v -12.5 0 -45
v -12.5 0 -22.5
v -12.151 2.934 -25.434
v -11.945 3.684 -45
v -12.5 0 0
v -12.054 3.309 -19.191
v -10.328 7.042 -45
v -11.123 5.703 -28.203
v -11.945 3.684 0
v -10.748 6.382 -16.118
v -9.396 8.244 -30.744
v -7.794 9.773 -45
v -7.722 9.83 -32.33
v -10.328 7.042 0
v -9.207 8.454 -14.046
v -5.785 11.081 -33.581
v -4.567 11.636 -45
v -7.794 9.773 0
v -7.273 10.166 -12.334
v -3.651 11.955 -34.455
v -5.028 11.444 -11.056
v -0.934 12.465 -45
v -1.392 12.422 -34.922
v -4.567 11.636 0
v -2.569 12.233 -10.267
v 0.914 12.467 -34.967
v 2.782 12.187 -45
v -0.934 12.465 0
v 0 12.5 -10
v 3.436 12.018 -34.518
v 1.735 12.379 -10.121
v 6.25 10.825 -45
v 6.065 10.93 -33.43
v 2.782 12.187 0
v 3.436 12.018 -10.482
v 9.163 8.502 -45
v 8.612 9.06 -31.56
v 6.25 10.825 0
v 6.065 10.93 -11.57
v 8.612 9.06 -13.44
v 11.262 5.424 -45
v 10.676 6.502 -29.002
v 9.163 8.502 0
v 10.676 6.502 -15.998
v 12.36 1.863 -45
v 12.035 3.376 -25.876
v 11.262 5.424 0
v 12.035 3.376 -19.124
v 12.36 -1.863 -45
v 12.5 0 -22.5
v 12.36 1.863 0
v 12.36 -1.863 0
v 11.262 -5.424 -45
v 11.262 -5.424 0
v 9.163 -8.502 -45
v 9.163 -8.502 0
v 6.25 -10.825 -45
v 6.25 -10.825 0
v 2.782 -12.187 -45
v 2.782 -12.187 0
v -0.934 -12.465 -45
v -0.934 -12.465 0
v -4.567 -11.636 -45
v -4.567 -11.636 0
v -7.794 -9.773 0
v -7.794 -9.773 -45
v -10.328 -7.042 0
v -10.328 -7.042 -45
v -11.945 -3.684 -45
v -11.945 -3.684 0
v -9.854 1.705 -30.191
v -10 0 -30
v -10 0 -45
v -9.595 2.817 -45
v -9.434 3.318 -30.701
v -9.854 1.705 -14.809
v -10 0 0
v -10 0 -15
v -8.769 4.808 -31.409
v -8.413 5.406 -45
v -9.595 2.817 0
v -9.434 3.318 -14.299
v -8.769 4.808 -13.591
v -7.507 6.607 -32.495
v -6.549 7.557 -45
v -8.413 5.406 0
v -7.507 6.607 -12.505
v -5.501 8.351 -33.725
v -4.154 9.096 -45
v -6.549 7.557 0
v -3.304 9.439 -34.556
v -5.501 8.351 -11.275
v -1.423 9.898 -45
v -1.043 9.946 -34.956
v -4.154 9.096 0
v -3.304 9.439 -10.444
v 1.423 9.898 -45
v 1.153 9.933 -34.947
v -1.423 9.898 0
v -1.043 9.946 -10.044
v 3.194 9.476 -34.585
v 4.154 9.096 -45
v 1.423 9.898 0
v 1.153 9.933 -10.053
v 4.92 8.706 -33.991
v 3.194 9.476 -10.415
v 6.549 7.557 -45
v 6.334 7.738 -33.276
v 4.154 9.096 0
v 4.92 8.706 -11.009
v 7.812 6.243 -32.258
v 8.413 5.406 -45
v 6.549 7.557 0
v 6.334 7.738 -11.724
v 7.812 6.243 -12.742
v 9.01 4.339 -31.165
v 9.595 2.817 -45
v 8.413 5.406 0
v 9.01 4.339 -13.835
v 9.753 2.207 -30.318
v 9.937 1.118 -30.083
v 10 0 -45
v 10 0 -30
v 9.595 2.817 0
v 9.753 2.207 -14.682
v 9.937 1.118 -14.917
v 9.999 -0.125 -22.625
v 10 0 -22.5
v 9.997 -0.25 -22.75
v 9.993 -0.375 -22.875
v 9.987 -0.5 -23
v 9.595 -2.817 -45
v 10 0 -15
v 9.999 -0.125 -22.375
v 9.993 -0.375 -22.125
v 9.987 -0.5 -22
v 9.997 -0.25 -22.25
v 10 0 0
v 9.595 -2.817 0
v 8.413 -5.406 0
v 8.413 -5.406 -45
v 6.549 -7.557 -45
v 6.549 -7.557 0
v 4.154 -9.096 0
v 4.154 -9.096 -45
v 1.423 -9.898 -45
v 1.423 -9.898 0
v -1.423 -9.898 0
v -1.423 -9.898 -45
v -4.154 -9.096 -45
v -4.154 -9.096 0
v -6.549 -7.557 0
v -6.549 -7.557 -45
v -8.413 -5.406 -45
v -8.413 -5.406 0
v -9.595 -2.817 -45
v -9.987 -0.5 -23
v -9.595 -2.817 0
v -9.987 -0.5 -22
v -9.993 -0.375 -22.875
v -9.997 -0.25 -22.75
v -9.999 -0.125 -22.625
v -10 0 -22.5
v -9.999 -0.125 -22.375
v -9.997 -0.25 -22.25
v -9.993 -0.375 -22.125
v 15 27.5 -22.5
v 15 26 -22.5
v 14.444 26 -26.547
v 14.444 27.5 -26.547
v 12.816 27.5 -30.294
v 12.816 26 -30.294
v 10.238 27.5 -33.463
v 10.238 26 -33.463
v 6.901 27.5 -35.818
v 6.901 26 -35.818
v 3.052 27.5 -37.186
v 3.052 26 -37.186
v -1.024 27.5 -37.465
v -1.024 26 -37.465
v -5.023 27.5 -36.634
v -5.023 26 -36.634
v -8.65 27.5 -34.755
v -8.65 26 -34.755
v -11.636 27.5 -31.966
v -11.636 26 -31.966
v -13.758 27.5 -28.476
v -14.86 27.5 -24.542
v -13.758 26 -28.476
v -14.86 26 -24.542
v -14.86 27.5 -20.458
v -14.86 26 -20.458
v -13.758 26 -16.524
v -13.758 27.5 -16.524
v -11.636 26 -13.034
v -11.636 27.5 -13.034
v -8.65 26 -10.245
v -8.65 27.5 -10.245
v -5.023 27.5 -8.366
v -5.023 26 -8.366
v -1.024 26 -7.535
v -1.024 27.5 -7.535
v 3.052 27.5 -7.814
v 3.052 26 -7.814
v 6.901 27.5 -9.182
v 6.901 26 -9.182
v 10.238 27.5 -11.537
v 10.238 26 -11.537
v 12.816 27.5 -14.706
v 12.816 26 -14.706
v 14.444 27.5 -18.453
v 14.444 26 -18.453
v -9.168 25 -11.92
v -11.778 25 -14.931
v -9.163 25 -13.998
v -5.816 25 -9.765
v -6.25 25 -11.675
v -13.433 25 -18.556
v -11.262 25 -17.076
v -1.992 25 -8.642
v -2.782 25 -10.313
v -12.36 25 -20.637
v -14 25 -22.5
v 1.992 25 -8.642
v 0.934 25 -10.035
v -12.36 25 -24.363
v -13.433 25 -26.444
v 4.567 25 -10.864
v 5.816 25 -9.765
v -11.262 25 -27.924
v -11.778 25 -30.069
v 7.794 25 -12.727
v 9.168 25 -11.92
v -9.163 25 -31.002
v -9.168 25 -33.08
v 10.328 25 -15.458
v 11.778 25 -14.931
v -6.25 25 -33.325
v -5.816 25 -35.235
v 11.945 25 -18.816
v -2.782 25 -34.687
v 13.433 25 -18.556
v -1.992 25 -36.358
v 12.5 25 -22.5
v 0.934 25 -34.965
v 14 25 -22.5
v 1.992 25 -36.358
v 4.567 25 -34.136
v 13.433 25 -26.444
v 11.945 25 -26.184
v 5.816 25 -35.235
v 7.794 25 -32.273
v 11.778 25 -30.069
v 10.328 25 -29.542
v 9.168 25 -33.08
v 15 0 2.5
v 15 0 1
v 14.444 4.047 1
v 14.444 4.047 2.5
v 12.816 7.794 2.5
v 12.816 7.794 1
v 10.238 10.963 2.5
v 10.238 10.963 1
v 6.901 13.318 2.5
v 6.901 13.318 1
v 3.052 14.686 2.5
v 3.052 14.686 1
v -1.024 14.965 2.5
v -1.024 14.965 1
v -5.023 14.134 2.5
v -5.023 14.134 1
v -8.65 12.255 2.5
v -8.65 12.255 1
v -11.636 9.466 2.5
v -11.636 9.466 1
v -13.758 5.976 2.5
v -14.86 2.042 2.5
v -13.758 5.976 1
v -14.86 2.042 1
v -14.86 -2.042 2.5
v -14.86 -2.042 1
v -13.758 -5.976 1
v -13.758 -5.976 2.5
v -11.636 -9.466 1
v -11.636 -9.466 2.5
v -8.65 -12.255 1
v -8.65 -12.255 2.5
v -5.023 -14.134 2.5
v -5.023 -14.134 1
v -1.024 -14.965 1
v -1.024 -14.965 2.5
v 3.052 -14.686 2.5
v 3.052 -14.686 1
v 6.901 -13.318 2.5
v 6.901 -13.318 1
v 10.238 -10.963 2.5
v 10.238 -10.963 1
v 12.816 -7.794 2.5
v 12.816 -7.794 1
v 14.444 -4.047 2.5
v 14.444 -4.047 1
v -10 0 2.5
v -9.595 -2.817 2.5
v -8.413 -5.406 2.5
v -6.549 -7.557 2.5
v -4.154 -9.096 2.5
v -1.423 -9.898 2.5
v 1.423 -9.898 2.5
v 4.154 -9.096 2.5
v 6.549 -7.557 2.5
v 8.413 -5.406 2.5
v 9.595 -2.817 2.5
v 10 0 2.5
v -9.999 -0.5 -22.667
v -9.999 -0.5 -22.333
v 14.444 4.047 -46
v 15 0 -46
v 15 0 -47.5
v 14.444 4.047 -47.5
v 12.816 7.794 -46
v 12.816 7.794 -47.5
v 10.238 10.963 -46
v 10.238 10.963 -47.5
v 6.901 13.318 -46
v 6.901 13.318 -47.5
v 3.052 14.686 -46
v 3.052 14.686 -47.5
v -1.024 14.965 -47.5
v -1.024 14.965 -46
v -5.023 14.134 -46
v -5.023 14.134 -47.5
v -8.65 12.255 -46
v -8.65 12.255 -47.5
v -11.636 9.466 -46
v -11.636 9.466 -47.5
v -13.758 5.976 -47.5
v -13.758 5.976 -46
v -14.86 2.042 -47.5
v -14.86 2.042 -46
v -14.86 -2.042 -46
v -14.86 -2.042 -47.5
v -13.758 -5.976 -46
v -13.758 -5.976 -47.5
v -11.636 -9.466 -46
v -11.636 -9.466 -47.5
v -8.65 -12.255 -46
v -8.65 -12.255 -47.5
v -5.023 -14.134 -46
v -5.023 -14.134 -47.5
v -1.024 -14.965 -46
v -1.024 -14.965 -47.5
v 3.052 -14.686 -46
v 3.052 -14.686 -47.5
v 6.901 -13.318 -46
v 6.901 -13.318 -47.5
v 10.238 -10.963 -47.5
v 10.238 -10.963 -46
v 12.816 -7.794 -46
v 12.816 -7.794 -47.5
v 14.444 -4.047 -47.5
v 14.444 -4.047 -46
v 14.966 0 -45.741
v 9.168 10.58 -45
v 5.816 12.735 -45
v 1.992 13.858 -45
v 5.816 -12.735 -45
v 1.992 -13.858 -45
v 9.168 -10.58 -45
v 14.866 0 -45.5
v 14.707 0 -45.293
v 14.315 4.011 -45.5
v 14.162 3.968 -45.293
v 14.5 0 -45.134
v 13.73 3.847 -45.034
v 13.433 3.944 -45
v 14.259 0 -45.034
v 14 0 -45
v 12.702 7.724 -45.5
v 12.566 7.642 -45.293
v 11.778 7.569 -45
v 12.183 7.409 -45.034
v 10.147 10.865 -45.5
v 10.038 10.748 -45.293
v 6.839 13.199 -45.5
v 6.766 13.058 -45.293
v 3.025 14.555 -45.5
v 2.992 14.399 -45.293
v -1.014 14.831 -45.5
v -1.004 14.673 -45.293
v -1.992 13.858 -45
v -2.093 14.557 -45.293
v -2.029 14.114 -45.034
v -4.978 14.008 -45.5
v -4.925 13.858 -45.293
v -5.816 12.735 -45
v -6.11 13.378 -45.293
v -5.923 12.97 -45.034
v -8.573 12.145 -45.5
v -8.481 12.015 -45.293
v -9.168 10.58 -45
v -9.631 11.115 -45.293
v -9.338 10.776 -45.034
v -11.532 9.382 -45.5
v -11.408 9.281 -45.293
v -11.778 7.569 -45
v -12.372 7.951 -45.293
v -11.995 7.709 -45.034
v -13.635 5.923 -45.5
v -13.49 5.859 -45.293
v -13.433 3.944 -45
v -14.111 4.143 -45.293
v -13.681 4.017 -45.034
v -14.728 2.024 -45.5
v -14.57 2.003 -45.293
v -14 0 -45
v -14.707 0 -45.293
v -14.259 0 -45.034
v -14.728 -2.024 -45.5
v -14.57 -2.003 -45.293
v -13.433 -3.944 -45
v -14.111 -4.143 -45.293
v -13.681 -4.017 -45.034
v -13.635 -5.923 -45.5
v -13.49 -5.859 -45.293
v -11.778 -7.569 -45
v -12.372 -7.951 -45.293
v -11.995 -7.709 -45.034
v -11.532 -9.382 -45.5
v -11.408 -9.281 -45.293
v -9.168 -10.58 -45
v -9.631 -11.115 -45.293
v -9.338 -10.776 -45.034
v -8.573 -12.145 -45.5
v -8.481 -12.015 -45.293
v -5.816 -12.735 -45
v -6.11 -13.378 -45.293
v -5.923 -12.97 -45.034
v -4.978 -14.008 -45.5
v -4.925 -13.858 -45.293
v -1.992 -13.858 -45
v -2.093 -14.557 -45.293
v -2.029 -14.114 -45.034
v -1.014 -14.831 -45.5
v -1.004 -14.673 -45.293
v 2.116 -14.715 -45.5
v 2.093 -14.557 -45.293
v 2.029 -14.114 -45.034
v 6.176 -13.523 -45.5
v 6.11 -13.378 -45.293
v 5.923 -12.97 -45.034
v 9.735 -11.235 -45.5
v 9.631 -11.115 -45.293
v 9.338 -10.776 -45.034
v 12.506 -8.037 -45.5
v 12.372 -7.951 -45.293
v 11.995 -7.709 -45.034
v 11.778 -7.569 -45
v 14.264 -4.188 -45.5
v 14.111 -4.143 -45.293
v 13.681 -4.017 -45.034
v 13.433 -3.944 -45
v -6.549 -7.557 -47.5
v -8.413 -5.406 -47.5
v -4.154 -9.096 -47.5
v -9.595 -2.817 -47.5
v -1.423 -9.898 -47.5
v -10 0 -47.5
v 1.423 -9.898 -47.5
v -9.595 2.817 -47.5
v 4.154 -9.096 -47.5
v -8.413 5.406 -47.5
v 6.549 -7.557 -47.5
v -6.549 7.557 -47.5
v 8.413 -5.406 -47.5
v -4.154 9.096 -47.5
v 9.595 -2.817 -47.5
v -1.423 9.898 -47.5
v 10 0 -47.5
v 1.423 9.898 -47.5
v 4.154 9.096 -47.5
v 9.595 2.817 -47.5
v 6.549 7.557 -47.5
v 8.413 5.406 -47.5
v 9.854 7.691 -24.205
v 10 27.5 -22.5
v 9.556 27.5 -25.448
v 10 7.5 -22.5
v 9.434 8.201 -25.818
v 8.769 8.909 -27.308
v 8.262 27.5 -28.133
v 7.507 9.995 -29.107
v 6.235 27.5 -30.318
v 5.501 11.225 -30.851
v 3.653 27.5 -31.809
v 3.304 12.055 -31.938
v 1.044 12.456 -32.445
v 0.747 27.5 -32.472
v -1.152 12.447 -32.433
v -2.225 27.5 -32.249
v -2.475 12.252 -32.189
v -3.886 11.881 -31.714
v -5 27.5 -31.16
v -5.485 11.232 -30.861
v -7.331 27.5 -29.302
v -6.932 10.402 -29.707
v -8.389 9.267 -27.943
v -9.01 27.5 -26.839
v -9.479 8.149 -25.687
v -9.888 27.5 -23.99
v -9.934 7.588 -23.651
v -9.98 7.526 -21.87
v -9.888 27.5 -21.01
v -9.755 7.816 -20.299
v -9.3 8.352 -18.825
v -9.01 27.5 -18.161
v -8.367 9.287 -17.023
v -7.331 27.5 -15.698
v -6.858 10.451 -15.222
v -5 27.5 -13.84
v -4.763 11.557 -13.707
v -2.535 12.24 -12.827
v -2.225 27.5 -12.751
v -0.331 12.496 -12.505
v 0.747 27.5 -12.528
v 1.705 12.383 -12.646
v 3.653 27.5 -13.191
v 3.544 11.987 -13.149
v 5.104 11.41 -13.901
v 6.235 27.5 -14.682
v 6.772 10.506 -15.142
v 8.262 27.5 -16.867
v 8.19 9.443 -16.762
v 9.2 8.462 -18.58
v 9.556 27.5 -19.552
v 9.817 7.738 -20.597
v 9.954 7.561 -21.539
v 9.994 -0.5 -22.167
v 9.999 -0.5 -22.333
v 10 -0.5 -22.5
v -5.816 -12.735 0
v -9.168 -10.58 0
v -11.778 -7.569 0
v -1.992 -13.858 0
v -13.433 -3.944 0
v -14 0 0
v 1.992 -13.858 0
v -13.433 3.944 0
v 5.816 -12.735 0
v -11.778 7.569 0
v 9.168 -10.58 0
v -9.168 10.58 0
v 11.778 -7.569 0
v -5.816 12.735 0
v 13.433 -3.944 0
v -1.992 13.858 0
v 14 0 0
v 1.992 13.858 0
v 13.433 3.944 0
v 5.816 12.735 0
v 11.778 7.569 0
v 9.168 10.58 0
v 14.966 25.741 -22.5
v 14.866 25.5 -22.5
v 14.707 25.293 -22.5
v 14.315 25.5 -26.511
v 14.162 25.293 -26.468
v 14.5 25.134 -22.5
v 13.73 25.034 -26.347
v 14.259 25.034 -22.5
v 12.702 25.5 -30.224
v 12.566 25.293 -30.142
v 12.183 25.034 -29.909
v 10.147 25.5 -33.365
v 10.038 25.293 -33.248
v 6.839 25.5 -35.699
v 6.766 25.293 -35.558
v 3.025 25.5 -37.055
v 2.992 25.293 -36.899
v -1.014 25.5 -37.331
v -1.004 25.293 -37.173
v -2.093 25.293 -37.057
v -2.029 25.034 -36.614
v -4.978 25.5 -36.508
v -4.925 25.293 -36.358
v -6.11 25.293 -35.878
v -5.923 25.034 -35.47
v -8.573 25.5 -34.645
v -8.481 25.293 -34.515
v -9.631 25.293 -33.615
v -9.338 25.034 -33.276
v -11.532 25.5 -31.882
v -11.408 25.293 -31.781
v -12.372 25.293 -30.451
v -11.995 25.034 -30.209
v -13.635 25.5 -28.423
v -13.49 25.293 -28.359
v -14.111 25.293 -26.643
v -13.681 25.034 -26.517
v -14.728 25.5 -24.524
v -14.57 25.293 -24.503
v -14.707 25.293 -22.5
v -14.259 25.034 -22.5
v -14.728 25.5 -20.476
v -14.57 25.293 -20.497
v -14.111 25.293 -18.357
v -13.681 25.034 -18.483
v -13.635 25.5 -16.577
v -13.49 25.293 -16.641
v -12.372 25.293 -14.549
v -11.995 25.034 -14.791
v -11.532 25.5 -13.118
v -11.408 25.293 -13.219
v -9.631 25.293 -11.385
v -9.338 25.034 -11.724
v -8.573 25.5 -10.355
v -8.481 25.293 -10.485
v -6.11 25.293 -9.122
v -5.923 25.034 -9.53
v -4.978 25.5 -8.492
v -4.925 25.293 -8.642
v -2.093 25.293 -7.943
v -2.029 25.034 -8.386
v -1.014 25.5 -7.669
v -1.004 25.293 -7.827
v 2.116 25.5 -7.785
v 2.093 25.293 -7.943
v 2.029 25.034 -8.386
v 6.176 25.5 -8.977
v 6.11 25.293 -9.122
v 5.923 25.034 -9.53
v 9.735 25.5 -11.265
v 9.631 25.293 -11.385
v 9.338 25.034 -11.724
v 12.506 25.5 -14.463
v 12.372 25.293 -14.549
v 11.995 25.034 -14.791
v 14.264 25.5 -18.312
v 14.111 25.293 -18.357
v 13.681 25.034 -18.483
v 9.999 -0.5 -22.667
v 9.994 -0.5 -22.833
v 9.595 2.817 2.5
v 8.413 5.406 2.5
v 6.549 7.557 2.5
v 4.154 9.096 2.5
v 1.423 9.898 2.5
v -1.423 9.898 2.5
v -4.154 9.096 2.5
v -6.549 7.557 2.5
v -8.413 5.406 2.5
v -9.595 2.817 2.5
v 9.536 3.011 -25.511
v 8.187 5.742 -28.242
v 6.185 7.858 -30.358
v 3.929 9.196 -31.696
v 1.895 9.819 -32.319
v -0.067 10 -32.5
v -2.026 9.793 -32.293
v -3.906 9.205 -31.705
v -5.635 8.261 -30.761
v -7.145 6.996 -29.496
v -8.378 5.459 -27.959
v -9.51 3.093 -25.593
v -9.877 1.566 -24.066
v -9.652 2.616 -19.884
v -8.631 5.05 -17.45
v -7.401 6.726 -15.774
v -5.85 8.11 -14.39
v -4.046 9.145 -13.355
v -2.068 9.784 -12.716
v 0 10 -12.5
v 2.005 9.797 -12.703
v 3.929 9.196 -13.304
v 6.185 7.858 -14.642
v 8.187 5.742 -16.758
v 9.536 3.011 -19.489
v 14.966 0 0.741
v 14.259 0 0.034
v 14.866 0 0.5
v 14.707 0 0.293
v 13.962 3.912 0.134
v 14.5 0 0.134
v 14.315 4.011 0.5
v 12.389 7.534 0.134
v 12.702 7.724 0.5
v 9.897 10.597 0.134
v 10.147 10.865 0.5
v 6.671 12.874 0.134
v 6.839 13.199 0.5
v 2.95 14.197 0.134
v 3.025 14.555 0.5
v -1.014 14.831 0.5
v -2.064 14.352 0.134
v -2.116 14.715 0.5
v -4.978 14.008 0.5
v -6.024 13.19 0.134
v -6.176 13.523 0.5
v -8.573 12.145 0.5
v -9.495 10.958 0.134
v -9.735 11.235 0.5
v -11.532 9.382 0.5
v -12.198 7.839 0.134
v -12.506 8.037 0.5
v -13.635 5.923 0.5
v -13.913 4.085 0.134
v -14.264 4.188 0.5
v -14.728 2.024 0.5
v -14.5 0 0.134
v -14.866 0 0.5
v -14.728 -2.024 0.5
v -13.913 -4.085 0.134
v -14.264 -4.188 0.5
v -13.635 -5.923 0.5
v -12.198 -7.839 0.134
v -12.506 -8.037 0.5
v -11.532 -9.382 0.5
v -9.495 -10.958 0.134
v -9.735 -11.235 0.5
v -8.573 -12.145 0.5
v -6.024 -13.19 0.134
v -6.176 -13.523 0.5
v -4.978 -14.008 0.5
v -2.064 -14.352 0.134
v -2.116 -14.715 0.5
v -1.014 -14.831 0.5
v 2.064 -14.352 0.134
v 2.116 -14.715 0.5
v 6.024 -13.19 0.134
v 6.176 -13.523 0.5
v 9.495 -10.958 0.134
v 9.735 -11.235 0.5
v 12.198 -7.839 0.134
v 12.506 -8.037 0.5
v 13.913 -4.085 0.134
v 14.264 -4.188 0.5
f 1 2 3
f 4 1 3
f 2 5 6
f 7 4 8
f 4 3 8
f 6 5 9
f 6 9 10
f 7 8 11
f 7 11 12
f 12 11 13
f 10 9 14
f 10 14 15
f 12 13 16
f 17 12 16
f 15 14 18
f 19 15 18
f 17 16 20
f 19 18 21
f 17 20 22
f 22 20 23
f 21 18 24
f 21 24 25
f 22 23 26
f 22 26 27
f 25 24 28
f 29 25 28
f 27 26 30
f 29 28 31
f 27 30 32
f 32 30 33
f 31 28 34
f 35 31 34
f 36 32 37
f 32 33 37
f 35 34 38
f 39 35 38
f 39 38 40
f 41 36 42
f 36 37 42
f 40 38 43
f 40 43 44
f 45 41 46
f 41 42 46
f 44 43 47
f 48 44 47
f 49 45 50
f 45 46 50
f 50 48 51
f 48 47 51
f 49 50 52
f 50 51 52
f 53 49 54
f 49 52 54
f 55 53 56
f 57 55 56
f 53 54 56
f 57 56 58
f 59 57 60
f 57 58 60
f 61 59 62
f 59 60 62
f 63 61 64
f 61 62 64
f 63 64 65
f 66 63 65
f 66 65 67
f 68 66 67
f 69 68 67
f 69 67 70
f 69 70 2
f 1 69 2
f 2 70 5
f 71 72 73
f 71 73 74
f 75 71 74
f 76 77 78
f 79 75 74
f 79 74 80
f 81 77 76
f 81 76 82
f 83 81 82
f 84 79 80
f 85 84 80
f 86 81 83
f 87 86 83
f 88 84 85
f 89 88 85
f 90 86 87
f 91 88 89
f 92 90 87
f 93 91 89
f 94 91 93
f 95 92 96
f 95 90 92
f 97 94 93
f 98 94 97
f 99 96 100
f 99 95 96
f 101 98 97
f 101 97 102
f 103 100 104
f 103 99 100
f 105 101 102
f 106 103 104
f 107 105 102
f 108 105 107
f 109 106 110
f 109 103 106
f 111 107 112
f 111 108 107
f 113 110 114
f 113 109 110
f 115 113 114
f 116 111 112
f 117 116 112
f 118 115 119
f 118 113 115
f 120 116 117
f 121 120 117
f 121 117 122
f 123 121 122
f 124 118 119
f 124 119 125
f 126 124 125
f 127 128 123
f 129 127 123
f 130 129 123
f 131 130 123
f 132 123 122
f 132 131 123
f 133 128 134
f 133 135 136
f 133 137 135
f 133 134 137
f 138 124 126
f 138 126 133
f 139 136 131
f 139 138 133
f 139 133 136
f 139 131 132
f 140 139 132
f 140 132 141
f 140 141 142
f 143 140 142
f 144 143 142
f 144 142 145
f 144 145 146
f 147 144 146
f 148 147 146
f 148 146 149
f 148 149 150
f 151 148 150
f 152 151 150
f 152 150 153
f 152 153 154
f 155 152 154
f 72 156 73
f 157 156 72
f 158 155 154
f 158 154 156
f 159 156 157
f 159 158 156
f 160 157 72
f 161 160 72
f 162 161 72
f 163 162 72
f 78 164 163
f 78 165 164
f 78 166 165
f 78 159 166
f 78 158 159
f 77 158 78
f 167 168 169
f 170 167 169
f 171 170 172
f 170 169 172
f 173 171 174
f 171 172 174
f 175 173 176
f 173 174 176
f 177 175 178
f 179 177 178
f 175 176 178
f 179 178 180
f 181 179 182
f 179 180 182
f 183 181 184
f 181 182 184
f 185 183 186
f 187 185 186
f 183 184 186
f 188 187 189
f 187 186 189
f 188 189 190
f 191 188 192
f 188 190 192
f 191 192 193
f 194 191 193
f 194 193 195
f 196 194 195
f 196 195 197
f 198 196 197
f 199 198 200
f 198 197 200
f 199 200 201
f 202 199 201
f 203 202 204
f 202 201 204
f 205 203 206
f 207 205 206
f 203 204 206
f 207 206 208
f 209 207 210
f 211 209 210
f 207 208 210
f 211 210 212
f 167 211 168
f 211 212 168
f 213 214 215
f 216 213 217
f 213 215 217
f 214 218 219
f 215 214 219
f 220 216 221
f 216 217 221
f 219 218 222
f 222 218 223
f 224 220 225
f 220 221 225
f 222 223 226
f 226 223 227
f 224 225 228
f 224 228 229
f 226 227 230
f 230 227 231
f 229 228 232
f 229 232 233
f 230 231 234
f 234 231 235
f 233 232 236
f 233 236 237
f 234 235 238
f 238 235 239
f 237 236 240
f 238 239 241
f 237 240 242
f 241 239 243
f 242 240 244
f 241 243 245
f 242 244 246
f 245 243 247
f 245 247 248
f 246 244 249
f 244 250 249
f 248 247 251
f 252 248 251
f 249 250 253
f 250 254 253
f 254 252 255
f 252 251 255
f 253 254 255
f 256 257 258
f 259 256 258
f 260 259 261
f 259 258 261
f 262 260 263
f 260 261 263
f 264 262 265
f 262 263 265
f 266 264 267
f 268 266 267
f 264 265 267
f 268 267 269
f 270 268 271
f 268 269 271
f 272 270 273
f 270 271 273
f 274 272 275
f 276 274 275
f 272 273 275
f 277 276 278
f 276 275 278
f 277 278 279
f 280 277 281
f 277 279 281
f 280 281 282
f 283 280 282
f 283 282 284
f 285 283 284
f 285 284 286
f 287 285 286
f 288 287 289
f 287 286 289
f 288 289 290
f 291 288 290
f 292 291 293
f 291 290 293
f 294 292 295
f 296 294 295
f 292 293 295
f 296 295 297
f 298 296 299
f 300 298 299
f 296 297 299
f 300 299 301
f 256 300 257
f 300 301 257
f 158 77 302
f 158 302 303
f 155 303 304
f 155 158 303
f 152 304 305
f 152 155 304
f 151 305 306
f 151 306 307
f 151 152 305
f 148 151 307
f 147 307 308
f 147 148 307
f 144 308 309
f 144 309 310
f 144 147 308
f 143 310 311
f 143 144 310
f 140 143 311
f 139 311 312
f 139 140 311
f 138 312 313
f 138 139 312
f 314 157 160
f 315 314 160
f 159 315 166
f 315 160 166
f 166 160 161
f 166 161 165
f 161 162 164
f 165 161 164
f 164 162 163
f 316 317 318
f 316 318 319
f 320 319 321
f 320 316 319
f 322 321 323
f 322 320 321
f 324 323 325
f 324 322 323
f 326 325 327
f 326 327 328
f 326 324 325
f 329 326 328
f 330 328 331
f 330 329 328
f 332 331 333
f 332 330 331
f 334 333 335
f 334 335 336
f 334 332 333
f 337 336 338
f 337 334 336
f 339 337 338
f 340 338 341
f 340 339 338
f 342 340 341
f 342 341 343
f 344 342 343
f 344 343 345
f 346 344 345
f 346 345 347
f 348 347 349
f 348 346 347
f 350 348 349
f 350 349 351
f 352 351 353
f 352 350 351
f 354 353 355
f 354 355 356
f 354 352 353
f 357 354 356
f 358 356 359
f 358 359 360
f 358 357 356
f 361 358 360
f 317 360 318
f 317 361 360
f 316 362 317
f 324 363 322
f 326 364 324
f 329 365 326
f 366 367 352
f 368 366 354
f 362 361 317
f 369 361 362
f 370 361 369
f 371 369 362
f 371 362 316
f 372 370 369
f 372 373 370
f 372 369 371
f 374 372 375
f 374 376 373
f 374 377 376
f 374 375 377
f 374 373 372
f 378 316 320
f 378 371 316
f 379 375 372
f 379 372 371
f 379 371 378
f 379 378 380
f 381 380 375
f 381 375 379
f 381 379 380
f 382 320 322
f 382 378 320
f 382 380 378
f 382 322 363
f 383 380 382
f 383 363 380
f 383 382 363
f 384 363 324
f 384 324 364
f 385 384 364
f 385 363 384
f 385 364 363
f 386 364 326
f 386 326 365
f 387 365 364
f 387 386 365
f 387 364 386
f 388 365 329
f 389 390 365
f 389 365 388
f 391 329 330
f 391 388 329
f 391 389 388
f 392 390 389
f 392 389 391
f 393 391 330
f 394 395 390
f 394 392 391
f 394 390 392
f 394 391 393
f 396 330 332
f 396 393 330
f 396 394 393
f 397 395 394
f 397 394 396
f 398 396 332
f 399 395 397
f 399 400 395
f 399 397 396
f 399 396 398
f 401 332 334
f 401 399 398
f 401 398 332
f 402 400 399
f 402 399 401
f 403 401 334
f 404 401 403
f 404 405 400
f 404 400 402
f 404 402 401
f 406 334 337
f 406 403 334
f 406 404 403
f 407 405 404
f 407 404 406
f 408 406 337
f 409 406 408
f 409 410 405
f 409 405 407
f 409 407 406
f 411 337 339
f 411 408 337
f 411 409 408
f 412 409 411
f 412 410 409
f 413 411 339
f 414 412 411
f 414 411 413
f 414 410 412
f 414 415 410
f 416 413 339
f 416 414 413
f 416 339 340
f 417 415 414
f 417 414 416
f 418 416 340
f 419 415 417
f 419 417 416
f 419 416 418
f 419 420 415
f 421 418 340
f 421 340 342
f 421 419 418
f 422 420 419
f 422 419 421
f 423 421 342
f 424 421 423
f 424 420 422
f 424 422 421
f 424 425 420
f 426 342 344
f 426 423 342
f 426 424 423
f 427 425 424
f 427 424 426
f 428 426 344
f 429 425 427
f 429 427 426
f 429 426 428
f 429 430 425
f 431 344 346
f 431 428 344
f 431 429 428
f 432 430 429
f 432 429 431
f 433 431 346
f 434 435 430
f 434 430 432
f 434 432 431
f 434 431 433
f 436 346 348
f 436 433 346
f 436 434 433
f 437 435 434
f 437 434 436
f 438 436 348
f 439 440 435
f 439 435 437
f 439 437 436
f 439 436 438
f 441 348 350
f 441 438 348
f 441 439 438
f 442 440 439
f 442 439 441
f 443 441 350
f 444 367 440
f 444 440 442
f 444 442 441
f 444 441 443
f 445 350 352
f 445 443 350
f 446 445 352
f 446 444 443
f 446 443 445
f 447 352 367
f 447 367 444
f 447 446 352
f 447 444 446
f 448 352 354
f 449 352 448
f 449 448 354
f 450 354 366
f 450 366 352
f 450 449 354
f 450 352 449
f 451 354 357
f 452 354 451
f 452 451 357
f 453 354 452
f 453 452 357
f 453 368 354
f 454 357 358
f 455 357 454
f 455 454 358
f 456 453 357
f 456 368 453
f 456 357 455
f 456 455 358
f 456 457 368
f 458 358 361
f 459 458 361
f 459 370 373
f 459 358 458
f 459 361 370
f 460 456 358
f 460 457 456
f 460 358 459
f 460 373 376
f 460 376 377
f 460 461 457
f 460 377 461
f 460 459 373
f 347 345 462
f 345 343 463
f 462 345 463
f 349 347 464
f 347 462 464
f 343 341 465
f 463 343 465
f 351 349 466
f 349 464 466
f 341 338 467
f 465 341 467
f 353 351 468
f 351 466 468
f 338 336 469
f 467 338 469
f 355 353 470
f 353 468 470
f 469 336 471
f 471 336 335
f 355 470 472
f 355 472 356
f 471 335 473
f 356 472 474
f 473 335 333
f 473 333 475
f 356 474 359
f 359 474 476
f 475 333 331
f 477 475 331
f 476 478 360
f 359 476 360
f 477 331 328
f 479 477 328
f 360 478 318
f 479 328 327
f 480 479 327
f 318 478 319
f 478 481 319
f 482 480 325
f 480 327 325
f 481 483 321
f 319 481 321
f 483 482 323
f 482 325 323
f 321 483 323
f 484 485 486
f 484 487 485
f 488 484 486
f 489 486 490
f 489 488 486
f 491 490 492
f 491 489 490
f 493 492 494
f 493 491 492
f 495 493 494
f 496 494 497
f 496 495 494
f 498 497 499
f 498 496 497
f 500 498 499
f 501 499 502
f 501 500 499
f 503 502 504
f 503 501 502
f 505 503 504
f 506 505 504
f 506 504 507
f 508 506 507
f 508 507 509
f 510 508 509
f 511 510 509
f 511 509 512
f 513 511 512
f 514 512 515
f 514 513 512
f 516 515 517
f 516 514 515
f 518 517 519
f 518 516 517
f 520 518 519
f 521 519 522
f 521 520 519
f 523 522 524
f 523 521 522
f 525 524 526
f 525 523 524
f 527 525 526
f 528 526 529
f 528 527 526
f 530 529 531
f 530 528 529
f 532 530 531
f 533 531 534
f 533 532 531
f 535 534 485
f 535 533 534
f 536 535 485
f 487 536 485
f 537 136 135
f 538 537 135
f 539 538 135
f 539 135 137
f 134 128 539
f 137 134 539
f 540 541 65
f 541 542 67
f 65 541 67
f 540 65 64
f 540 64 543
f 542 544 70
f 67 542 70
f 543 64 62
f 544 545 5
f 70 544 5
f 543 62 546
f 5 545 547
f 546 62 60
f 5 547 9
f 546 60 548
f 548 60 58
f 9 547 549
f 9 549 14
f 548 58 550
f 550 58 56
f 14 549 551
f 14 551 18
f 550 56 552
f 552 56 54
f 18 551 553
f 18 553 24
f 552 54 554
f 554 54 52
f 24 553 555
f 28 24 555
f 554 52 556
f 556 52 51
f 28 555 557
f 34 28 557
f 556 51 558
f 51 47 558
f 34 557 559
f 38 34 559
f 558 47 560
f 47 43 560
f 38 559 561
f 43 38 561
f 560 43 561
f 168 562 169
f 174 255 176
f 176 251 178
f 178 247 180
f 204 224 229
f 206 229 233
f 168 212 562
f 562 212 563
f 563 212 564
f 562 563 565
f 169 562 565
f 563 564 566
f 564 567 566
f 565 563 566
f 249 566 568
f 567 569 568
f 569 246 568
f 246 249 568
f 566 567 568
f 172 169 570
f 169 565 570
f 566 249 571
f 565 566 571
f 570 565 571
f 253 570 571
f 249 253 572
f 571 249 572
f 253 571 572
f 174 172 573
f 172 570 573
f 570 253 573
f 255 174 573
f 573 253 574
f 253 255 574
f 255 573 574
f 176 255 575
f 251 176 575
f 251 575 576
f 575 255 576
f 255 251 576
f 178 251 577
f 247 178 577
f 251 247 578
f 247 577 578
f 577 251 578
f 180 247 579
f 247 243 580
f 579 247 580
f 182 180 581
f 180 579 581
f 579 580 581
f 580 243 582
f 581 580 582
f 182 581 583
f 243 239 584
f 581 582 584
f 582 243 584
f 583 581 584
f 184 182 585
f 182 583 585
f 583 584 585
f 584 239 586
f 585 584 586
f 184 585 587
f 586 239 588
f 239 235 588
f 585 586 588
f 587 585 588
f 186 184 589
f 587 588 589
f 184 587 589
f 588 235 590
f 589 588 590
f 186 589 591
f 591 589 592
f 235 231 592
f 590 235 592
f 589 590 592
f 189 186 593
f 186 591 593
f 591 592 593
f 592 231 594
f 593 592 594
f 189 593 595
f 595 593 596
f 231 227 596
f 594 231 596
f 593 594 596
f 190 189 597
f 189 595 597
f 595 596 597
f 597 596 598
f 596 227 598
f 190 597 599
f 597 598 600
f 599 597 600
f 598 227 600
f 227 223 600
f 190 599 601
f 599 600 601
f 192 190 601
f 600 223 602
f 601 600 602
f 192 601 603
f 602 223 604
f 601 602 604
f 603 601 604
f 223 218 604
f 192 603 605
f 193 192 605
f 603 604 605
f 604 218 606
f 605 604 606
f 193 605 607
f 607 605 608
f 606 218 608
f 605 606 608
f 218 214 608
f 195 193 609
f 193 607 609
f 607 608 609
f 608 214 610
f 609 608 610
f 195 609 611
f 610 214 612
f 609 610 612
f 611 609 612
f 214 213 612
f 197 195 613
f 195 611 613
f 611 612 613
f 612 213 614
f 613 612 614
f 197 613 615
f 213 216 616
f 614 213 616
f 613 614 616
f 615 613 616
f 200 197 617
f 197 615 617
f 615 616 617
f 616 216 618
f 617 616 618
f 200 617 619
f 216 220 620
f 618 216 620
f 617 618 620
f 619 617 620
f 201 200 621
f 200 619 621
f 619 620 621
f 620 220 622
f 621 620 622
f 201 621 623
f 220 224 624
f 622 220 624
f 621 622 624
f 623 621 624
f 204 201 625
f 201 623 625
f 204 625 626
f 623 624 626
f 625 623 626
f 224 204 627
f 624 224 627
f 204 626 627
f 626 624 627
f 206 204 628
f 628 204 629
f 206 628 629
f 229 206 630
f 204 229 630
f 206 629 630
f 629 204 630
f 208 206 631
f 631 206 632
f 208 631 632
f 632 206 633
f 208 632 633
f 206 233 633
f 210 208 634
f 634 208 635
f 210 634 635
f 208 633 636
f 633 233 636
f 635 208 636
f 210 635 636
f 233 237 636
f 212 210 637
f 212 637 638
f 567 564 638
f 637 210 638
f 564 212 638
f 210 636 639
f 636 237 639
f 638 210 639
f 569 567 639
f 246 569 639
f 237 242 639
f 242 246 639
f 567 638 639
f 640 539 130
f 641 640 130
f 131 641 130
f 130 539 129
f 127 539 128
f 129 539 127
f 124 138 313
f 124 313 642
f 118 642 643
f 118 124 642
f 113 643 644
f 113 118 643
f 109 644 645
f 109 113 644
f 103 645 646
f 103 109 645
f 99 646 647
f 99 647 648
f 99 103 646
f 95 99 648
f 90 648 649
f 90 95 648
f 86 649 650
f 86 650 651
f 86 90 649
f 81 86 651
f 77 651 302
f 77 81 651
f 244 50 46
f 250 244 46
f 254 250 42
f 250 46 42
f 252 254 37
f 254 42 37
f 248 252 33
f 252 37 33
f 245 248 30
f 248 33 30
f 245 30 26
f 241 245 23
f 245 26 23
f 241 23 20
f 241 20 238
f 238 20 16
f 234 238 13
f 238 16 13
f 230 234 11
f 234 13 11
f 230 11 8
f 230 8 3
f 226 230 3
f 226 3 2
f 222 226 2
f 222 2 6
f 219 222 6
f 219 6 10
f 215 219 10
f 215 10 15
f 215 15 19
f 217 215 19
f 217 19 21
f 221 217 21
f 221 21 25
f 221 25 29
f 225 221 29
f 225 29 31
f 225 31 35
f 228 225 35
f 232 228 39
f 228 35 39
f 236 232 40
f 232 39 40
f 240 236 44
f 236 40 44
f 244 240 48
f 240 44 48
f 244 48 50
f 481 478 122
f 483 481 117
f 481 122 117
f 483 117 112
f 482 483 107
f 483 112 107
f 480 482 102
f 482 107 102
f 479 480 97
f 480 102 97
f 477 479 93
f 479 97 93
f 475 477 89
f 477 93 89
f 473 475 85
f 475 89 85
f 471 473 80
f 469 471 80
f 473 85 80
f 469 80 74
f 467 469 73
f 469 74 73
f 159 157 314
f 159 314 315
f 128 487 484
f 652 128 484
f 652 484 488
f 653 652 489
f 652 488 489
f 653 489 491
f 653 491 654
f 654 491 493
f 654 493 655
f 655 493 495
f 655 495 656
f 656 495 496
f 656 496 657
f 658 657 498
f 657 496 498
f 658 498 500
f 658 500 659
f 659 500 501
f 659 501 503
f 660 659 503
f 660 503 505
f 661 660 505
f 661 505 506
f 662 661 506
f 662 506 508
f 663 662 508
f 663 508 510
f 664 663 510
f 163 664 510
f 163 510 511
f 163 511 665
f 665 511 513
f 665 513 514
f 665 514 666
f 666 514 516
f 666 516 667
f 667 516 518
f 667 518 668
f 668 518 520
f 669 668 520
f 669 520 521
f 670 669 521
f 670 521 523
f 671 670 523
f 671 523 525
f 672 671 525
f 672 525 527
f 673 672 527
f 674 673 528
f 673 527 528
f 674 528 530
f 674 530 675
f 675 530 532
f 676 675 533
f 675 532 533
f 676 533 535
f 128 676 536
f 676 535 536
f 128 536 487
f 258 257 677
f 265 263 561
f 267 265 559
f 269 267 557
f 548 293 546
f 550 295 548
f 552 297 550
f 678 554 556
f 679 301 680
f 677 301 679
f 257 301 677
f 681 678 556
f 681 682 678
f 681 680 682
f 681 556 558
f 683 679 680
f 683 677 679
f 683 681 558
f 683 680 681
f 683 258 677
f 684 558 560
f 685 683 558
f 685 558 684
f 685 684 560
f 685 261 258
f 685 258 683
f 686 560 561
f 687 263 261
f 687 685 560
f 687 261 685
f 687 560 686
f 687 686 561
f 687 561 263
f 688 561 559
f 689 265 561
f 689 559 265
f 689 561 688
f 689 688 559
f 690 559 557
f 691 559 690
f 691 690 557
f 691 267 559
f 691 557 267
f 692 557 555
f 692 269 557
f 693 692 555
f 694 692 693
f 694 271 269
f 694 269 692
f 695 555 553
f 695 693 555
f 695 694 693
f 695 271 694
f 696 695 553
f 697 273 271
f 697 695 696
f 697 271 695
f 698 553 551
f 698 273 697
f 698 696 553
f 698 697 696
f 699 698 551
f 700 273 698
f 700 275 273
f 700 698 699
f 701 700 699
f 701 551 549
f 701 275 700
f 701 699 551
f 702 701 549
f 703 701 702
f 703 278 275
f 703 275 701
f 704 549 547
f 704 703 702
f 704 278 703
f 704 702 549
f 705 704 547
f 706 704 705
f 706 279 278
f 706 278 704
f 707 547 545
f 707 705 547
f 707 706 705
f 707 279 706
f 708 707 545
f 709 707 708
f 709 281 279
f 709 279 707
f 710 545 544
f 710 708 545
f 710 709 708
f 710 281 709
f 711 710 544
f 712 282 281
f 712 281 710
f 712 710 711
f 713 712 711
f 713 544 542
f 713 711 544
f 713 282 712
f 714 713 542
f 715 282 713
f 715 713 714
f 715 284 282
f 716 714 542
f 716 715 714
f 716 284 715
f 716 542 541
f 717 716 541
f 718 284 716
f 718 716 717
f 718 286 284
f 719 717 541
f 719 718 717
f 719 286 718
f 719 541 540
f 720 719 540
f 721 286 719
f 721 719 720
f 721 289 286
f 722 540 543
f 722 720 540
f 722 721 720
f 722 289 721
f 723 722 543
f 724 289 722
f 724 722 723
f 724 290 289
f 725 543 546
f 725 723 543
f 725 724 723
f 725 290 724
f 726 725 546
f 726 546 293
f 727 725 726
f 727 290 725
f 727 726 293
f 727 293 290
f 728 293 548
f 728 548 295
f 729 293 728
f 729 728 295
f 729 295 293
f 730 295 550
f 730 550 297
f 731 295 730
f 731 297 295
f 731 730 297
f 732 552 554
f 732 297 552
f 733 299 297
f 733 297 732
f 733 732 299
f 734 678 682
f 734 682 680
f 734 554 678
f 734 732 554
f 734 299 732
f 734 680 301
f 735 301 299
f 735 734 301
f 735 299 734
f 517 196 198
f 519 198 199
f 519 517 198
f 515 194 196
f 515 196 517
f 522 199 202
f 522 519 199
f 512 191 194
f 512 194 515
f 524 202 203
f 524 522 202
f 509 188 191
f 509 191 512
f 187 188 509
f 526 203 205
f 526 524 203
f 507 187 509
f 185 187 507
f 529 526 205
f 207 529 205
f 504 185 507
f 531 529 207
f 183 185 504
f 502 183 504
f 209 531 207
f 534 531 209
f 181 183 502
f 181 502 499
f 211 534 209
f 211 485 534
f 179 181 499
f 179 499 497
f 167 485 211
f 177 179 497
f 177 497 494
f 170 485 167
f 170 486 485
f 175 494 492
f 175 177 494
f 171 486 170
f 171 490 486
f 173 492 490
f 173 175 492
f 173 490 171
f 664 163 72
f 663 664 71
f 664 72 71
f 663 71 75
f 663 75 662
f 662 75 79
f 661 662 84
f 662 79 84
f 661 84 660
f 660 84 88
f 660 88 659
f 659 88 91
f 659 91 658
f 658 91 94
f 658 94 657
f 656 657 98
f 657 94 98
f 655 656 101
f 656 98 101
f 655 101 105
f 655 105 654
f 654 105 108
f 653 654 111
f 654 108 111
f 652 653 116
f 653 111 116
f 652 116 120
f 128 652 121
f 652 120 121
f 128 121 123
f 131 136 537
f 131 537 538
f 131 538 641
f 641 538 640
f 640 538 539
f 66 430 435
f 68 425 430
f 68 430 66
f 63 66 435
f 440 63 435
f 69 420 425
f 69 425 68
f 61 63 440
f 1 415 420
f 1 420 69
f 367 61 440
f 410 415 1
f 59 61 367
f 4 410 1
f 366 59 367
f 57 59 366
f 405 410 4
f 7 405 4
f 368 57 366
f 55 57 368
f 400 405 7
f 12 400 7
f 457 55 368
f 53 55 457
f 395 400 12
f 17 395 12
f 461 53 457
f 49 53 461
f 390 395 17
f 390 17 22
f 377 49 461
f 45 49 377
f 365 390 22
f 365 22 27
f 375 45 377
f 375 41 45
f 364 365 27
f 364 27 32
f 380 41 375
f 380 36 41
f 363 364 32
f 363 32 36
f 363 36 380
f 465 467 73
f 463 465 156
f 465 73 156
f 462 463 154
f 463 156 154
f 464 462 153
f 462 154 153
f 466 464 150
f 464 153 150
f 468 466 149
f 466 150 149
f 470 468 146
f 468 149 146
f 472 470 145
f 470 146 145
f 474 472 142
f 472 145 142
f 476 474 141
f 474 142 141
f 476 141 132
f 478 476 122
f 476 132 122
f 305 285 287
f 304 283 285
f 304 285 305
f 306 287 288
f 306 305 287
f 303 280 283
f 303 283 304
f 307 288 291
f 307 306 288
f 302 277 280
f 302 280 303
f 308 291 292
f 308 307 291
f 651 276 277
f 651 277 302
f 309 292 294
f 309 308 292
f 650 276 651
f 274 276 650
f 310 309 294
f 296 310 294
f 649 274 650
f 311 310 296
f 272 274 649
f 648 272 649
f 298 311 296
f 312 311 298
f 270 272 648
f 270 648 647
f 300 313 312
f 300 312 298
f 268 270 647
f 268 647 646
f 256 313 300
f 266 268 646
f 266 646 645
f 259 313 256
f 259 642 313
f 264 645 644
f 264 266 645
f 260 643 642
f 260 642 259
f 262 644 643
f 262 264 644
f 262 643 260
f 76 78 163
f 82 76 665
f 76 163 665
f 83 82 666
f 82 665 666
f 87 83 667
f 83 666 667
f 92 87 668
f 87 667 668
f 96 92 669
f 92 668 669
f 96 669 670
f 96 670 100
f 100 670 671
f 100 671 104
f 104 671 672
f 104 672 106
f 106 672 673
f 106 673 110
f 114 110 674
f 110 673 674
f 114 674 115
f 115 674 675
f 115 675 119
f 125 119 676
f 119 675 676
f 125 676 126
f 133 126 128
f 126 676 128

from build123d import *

# Parameters (mm, degrees)
CROQUIS1_R            = 15
CROQUIS1_R_2          = 10
EXTRUIR_L_MINA1_DEPTH = 2.5
CROQUIS2_R            = 12.5
CROQUIS2_R_2          = 10
EXTRUIR_L_MINA2_DEPTH = 45
REDONDEO3_R           = 1
CROQUIS5_R            = 12.5
CROQUIS5_R_2          = 10
EXTRUIR_L_MINA3_DEPTH = 25
CROQUIS6_R            = 15
CROQUIS6_R_2          = 10
EXTRUIR_L_MINA4_DEPTH = 2.5
REDONDEO4_R           = 1
CROQUIS7_R            = 10
CORTAR_EXTRUIR1_DEPTH = 51
CROQUIS8_R            = 10
CORTAR_EXTRUIR2_DEPTH = 28


with BuildPart() as part:
    # Croquis1 → Extruir-Lámina1 (new body)
    with BuildSketch(Plane.XY):
        Circle(CROQUIS1_R)
        Circle(CROQUIS1_R_2, mode=Mode.SUBTRACT)
    extruir_l_mina1 = extrude(amount=EXTRUIR_L_MINA1_DEPTH)

    # Croquis2 → Extruir-Lámina2 (add)
    with BuildSketch(Plane(origin=(0, 0, 0), x_dir=(-1, 0, 0), z_dir=(0, 0, -1))):
        Circle(CROQUIS2_R)
        Circle(CROQUIS2_R_2, mode=Mode.SUBTRACT)
    extrude(amount=EXTRUIR_L_MINA2_DEPTH)

    # Simetría1: Extruir-Lámina1 across plane
    add(extruir_l_mina1.mirror(Plane.XY.offset(-22.5)))

    # Redondeo3
    redondeo3_edges = [part.edges().sort_by_distance(p)[0] for p in [
        (-15, 0, -45),
        (-15, 0, 0),
    ]]
    fillet(redondeo3_edges, radius=REDONDEO3_R)

    # Croquis5 → Extruir-Lámina3 (add)
    with BuildSketch(Plane(origin=(0, 0, 0), x_dir=(1, 0, 0), z_dir=(0, 1, 0))):
        with Locations((0, 22.5)):
            Circle(CROQUIS5_R)
        with Locations((0, 22.5)):
            Circle(CROQUIS5_R_2, mode=Mode.SUBTRACT)
    extrude(amount=EXTRUIR_L_MINA3_DEPTH)

    # Croquis6 → Extruir-Lámina4 (add)
    with BuildSketch(Plane(origin=(0, 25, 0), x_dir=(1, 0, 0), z_dir=(0, 1, 0))):
        with Locations((0, 22.5)):
            Circle(CROQUIS6_R)
        with Locations((0, 22.5)):
            Circle(CROQUIS6_R_2, mode=Mode.SUBTRACT)
    extrude(amount=EXTRUIR_L_MINA4_DEPTH)

    # Redondeo4
    redondeo4_edges = [part.edges().sort_by_distance(p)[0] for p in [
        (-15, 25, -22.5),
    ]]
    fillet(redondeo4_edges, radius=REDONDEO4_R)

    # Croquis7 → Cortar-Extruir1 (cut, through all)
    with BuildSketch(Plane(origin=(0, 0, -47.5), x_dir=(-1, 0, 0), z_dir=(0, 0, -1))):
        Circle(CROQUIS7_R)
    extrude(amount=-CORTAR_EXTRUIR1_DEPTH, mode=Mode.SUBTRACT)

    # Croquis8 → Cortar-Extruir2 (cut)
    with BuildSketch(Plane(origin=(0, 27.5, 0), x_dir=(1, 0, 0), z_dir=(0, 1, 0))):
        with Locations((0, 22.5)):
            Circle(CROQUIS8_R)
    extrude(amount=-CORTAR_EXTRUIR2_DEPTH, mode=Mode.SUBTRACT)


solid = part.part
